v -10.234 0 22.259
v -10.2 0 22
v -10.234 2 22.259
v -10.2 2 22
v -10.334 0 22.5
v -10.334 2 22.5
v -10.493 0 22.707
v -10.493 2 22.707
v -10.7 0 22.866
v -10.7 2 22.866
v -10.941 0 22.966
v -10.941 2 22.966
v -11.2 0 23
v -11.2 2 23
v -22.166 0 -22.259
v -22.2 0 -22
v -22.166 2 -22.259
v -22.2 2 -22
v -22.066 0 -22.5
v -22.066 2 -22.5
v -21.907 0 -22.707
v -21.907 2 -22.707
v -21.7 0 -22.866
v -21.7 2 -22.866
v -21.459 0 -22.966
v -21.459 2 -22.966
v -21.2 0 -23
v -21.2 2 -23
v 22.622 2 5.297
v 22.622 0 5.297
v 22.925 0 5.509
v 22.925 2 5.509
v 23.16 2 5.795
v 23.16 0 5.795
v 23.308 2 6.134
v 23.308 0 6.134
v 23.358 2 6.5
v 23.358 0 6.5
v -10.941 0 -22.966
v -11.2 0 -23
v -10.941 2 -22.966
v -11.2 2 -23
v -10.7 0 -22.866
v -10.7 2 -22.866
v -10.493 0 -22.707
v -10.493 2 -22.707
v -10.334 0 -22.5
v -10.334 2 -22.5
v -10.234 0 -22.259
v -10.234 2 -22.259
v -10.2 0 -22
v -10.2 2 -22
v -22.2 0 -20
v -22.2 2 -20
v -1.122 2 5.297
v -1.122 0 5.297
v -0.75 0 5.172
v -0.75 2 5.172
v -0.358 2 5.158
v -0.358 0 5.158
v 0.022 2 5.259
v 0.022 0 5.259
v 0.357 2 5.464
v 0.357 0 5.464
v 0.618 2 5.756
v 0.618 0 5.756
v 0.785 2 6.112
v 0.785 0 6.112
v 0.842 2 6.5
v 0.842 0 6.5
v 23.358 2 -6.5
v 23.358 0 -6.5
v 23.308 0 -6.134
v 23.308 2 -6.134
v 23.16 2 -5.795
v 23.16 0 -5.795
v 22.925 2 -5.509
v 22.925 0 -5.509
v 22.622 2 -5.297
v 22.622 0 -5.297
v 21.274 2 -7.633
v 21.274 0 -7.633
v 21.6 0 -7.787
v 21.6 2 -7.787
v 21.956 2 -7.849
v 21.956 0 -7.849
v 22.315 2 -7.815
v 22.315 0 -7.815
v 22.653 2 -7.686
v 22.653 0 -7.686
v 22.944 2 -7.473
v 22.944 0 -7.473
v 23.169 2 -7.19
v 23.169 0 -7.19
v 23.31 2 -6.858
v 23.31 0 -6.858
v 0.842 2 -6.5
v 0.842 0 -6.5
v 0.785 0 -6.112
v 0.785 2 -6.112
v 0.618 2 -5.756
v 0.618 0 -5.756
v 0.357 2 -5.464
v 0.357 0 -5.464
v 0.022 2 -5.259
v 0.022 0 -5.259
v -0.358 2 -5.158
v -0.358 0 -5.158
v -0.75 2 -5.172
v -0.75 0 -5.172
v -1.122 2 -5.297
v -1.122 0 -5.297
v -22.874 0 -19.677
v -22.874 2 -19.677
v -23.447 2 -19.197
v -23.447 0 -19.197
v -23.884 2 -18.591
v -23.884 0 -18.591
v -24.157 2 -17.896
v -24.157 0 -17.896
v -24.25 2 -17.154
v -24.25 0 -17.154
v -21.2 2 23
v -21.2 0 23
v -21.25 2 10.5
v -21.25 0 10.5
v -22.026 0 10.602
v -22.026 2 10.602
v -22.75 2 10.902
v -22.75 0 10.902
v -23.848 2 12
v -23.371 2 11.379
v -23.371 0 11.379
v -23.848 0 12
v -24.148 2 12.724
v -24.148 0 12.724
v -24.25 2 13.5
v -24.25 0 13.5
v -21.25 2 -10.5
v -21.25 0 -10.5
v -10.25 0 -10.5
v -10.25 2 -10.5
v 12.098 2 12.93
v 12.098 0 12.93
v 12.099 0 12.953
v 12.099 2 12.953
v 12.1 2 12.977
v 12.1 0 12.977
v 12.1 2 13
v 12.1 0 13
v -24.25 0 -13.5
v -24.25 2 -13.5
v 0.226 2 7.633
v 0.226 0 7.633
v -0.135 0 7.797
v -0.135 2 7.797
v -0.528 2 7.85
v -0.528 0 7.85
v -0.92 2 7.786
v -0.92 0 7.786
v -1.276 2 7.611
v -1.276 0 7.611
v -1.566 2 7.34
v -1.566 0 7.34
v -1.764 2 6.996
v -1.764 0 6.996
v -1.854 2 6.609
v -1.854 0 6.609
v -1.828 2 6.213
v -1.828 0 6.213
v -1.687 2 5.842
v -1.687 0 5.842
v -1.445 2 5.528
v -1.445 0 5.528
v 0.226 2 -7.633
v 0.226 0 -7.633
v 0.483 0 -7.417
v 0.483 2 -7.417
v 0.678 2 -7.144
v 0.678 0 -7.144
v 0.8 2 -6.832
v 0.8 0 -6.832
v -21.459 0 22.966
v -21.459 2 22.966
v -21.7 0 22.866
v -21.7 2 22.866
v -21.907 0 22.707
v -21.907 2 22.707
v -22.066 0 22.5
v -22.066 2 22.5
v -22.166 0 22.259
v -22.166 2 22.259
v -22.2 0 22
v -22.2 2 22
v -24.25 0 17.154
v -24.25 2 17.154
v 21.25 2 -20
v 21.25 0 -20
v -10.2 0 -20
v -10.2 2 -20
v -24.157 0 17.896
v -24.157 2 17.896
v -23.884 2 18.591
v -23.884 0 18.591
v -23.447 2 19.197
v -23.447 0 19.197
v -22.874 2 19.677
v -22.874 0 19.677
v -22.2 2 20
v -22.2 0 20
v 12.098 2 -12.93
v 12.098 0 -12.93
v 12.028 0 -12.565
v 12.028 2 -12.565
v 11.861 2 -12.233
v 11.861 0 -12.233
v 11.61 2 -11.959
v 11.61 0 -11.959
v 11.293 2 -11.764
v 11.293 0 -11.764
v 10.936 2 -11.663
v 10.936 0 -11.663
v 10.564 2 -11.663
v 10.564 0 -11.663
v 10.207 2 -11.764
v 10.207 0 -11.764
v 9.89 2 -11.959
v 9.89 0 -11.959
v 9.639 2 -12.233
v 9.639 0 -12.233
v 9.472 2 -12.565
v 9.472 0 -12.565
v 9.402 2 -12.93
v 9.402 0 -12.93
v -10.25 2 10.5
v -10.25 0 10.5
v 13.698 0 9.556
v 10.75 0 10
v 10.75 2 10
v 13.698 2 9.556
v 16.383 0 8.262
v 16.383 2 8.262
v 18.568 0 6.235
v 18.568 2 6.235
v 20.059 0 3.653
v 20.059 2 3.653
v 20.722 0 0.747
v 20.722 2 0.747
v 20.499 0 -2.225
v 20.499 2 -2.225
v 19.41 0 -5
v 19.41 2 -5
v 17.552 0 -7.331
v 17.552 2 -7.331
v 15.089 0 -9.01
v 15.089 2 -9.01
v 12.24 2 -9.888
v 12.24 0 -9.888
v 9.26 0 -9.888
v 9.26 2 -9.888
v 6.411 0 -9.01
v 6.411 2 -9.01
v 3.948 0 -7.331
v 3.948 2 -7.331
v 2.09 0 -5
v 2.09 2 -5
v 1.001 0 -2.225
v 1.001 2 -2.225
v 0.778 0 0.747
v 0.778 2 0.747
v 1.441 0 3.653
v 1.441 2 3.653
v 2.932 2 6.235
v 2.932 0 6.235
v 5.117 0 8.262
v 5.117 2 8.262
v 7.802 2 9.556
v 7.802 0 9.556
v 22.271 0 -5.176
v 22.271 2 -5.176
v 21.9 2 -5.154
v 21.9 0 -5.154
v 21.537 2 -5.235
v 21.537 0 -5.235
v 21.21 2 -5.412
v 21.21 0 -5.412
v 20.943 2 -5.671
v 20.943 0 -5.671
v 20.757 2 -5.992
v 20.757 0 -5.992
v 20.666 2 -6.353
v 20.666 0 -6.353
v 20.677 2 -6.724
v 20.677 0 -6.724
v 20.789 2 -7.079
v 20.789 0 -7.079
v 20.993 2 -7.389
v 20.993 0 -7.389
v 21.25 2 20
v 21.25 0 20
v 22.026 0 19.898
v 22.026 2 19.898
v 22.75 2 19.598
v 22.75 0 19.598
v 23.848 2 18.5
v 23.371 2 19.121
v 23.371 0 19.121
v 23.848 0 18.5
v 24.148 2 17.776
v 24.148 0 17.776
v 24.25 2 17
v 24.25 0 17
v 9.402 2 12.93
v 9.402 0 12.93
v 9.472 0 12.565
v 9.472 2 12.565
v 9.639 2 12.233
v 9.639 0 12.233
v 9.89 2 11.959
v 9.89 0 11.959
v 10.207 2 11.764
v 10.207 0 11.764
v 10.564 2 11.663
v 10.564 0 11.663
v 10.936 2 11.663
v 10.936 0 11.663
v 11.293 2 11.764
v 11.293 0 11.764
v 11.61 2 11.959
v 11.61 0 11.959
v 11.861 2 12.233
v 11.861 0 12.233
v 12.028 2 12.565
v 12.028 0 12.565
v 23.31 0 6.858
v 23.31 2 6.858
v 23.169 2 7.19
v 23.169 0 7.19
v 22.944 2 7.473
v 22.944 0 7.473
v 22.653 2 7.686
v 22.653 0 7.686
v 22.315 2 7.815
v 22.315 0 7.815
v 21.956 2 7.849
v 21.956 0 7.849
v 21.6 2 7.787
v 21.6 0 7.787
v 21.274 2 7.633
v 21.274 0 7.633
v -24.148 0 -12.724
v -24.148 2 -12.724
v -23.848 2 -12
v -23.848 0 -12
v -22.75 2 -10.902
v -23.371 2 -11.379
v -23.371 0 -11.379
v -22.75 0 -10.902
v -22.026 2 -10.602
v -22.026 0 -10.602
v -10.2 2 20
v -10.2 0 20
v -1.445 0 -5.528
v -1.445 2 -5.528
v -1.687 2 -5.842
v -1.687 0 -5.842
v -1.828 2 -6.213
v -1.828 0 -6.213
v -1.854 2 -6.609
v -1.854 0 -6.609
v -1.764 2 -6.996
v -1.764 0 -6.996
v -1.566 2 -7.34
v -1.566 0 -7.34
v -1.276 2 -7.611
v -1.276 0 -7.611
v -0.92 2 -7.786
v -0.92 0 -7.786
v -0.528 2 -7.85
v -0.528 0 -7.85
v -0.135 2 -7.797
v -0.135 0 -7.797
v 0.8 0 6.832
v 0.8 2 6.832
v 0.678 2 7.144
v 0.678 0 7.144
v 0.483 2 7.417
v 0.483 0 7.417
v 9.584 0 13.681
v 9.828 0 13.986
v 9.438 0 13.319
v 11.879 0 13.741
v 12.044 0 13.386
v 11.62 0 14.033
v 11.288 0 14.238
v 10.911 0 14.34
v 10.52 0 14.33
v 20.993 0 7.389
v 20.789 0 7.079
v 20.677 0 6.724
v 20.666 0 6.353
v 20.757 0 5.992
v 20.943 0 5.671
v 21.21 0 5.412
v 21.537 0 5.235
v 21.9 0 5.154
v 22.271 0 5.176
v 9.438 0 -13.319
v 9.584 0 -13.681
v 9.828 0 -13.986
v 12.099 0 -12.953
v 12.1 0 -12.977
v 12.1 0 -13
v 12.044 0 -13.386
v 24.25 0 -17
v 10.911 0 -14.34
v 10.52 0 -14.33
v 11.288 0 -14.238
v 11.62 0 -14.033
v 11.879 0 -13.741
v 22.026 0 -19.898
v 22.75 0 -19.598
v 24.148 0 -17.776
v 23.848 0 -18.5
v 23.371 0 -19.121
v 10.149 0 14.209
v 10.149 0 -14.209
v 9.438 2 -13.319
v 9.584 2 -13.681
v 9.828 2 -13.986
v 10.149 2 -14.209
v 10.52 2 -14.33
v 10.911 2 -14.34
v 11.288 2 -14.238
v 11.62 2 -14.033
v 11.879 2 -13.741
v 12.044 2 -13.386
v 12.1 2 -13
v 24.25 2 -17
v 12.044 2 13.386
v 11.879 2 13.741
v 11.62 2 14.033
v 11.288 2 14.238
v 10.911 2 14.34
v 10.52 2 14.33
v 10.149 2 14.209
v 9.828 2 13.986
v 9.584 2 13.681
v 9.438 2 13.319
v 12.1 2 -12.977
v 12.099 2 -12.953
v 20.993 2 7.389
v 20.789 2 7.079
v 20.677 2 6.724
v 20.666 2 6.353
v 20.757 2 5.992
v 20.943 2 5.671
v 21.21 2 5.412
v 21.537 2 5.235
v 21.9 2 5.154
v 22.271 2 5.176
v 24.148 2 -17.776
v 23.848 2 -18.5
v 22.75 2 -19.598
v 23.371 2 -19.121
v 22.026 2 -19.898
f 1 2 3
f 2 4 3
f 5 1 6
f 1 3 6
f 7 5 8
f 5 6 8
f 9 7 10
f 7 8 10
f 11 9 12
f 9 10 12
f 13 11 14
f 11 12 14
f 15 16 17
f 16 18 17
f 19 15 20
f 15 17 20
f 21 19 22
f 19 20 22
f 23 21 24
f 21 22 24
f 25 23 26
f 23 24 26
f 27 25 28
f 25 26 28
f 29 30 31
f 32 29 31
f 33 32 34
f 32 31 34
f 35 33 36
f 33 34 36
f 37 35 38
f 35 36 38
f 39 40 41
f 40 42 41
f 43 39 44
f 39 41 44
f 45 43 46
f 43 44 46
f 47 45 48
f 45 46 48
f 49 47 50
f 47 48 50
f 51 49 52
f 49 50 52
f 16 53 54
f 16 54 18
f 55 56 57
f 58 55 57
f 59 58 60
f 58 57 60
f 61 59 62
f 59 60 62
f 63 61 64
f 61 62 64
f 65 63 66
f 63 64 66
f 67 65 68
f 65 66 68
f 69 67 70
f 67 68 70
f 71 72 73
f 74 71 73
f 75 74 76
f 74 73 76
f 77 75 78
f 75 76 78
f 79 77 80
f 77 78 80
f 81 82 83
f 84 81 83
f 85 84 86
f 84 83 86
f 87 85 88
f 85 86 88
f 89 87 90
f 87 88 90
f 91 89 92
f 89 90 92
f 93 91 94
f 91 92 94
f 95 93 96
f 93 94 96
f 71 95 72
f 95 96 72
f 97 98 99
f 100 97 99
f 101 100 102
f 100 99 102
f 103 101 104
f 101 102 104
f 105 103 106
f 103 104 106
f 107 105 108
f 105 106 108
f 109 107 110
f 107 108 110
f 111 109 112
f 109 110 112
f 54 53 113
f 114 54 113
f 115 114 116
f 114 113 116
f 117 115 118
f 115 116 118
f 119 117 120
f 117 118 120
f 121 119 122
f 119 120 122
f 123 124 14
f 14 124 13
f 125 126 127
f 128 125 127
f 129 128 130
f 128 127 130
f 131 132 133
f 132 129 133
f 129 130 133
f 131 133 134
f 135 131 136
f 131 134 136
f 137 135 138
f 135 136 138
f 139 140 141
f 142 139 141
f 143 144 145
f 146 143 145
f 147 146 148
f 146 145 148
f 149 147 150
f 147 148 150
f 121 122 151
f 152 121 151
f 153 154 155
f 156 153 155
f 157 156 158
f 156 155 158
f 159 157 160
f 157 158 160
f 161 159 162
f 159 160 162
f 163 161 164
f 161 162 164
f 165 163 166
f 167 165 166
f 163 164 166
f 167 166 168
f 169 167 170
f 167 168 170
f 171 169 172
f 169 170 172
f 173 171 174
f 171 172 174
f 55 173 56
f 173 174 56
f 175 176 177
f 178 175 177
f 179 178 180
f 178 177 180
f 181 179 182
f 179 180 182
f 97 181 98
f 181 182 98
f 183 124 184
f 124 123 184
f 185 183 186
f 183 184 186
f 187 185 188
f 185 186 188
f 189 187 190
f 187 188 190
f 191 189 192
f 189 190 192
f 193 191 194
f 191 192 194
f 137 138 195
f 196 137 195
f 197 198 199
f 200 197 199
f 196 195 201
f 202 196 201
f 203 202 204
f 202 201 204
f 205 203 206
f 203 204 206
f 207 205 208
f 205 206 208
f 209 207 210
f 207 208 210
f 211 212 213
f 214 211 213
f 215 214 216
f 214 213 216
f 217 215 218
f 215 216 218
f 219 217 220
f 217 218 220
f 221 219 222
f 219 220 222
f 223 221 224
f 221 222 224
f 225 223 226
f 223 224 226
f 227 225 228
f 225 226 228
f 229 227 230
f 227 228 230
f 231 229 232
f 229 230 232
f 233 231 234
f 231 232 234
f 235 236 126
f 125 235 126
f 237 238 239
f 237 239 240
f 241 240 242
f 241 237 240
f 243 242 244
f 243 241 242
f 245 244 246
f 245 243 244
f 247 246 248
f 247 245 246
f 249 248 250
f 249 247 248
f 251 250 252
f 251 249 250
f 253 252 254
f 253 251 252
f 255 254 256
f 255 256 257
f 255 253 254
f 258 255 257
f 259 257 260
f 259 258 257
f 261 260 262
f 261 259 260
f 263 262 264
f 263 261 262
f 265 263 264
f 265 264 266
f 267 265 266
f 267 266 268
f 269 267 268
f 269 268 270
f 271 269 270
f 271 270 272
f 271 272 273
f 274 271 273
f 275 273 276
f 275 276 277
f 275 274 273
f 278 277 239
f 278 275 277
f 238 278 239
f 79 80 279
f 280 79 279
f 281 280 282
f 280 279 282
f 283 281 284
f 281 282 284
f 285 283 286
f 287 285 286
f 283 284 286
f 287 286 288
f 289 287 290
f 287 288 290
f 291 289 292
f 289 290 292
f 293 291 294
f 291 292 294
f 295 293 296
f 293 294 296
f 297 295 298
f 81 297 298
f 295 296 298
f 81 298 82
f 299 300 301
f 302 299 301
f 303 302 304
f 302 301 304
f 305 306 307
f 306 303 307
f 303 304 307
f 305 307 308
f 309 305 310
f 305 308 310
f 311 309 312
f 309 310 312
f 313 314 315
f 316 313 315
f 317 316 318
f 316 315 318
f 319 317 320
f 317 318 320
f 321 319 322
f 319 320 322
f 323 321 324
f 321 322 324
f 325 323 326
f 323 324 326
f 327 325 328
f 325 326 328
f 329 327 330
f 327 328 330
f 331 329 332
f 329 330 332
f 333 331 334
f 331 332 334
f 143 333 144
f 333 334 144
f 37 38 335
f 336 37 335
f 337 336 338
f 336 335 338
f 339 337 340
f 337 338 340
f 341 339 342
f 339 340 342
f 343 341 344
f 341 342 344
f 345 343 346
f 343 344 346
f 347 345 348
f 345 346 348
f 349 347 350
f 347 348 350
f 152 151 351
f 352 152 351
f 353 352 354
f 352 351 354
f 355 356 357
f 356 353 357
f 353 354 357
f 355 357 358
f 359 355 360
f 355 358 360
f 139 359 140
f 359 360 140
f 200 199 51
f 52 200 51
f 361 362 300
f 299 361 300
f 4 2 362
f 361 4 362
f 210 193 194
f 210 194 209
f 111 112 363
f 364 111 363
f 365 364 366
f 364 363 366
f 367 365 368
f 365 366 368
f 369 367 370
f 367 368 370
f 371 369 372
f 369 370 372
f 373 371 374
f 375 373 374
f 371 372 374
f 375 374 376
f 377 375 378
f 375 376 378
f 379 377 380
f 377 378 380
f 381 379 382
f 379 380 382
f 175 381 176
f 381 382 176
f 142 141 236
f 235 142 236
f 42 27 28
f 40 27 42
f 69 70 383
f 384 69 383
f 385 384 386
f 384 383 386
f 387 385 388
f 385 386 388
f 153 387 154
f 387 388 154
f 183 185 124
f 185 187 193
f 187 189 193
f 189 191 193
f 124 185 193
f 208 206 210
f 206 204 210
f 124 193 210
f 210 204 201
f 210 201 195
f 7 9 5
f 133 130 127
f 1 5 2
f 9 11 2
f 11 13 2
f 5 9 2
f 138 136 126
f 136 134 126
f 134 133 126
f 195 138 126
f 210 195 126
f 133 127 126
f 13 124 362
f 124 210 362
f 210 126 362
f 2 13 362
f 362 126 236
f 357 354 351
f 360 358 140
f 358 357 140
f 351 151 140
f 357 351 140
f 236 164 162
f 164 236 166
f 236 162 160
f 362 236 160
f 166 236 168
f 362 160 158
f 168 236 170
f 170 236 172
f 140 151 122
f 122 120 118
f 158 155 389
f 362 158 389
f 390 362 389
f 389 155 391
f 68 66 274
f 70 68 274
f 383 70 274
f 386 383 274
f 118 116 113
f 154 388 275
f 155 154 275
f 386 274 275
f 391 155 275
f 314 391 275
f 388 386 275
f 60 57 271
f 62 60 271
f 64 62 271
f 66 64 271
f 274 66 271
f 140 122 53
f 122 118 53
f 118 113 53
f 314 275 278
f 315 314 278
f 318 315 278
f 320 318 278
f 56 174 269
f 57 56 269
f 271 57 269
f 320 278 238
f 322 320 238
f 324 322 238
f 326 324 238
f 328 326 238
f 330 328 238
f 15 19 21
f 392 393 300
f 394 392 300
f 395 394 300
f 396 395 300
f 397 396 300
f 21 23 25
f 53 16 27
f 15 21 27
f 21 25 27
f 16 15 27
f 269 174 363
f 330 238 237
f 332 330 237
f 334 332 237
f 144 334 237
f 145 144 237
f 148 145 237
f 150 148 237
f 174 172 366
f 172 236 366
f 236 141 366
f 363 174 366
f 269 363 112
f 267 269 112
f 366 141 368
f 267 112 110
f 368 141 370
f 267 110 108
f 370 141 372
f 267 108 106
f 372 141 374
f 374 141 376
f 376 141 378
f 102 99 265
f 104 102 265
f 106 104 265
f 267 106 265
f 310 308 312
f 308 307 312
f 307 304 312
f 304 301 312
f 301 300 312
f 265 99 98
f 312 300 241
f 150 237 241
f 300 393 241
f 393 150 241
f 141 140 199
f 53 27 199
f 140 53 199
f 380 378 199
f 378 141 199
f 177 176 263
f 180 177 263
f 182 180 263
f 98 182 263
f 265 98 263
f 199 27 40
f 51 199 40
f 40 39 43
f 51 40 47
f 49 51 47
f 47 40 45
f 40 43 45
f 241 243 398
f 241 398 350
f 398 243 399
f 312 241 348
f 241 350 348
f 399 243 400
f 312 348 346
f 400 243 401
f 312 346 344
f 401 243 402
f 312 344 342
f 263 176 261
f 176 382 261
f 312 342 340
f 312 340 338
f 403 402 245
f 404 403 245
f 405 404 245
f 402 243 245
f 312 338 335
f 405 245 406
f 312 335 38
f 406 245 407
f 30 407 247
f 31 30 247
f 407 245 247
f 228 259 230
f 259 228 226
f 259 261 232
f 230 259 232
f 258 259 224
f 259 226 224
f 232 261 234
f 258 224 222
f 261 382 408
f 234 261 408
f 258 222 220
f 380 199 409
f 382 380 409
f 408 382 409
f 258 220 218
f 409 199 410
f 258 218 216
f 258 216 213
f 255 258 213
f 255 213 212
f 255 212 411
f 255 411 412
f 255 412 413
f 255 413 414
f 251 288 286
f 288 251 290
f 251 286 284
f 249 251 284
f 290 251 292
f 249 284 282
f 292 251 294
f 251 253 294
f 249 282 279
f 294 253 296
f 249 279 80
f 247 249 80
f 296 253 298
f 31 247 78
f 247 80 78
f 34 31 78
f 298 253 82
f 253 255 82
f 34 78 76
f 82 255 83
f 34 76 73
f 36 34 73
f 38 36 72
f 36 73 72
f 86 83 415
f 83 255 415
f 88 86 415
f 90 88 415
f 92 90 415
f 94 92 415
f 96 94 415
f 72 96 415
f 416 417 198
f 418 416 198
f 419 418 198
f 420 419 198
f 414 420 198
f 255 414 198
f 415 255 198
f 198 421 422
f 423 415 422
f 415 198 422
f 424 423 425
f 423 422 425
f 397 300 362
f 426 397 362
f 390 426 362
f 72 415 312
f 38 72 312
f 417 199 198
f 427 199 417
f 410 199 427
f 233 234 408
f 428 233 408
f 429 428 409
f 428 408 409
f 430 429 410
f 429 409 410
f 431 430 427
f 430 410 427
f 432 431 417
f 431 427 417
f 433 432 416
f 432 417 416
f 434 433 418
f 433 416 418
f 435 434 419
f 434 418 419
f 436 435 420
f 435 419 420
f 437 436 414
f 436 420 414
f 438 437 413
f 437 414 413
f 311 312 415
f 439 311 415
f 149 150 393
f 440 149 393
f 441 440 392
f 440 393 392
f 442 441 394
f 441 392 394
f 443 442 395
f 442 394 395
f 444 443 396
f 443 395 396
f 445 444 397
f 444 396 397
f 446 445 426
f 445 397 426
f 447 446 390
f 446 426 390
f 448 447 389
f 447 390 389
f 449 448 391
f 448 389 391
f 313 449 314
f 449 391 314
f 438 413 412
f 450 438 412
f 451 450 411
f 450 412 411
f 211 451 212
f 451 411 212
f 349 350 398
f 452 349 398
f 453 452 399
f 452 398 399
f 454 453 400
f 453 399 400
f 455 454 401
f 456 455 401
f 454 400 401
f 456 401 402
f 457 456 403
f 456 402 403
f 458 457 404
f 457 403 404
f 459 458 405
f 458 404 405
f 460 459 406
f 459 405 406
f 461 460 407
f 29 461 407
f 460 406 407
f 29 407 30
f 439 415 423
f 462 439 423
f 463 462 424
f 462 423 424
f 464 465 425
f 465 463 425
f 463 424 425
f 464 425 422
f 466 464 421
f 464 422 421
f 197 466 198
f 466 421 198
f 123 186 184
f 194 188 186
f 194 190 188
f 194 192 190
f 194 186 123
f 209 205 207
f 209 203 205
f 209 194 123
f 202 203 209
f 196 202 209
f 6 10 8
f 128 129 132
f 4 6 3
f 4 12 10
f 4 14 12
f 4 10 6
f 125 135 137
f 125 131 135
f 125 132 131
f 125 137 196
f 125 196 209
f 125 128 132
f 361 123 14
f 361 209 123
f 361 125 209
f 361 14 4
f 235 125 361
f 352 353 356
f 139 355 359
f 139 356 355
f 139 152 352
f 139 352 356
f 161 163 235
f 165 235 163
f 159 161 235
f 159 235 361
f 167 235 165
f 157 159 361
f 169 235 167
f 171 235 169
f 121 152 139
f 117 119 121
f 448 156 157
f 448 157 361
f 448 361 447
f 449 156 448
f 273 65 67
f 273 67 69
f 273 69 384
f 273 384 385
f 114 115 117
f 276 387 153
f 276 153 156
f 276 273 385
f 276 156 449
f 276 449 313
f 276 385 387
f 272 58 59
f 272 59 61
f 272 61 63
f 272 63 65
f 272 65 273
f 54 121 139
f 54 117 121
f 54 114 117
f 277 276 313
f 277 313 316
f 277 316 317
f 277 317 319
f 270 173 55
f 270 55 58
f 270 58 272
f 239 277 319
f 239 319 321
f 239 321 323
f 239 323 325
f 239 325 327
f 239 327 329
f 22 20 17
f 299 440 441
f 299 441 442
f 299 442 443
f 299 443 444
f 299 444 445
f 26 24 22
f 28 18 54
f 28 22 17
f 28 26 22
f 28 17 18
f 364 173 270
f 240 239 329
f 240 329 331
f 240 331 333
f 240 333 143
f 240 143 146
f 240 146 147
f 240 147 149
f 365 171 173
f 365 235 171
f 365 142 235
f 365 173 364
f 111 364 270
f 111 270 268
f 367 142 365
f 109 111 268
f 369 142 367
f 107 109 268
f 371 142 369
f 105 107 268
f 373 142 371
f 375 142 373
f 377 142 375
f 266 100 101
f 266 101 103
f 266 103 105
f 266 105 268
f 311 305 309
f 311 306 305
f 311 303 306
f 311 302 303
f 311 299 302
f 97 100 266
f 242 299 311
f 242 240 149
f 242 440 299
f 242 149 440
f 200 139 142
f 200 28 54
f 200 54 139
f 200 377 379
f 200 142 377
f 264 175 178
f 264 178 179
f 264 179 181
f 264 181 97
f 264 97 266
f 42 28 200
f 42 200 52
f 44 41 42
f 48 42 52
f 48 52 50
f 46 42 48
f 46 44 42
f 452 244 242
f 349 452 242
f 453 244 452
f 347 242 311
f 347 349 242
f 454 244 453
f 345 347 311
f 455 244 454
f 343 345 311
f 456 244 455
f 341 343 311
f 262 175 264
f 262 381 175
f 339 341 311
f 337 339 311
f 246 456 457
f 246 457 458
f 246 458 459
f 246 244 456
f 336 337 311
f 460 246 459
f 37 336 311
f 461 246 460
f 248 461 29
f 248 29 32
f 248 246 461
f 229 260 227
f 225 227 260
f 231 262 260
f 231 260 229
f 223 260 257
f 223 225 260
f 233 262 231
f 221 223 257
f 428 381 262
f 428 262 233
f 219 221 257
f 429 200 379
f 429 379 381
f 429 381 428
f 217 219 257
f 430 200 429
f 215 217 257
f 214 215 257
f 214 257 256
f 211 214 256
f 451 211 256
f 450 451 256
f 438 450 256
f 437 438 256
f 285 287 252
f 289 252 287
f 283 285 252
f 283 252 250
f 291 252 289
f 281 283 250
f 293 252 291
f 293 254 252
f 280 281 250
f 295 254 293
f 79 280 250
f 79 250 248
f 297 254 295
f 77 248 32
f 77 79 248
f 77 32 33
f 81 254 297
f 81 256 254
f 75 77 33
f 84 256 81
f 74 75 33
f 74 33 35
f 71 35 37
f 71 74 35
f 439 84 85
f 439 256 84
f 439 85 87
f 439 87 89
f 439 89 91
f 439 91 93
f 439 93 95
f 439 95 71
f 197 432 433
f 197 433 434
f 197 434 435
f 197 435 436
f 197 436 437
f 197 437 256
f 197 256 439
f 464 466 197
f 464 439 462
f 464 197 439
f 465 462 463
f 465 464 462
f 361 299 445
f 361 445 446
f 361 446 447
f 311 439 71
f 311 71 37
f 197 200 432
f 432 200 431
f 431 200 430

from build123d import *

# Parameters (mm, degrees)
SKETCH_1_W      = 12
SKETCH_1_H      = 3
SKETCH_1_R      = 10
EXTRUDE_1_DEPTH = 2
FILLET_1_R      = 3
FILLET_2_R      = 1


with BuildPart() as part:
    # 草图1 → 凸台-拉伸1 (new body)
    # profile 1 of 4: a face of its own
    with BuildSketch(Plane(origin=(0, 0, 0), x_dir=(1, 0, 0), z_dir=(0, 1, 0))):
        Polygon((-24.25, -10.5), (-24.25, -20), (-22.2, -20), (-10.2, -20), (24.25, -20), (24.25, 20), (-10.2, 20), (-22.2, 20), (-24.25, 20), (-24.25, 10.5), (-10.25, 10.5), (-10.25, -10.5), align=None)
        with BuildLine():
            ThreePointArc((22.621714683, 5.297394688), (23.75, 0), (22.621714683, -5.297394688))
            ThreePointArc((22.621714683, -5.297394688), (23.159540262, -5.794864902), (23.358330249, -6.5))
            ThreePointArc((23.358330249, -6.5), (22.652739816, -7.686269915), (21.273535715, -7.632509158))
            ThreePointArc((21.273535715, -7.632509158), (17.25, -11.258330249), (12.098178968, -12.929903846))
            ThreePointArc((12.098178968, -12.929903846), (12.099544665, -12.964940098), (12.1, -13))
            ThreePointArc((12.1, -13), (10.714940098, -14.349544665), (9.401821032, -12.929903846))
            ThreePointArc((9.401821032, -12.929903846), (4.25, -11.258330249), (0.226464285, -7.632509158))
            ThreePointArc((0.226464285, -7.632509158), (-1.677464544, -7.175), (-1.121714683, -5.297394688))
            ThreePointArc((-1.121714683, -5.297394688), (-2.25, 0), (-1.121714683, 5.297394688))
            ThreePointArc((-1.121714683, 5.297394688), (-1.677464544, 7.175), (0.226464285, 7.632509158))
            ThreePointArc((0.226464285, 7.632509158), (4.25, 11.258330249), (9.401821032, 12.929903846))
            ThreePointArc((9.401821032, 12.929903846), (10.714940098, 14.349544665), (12.1, 13))
            ThreePointArc((12.1, 13), (12.099544665, 12.964940098), (12.098178968, 12.929903846))
            ThreePointArc((12.098178968, 12.929903846), (17.25, 11.258330249), (21.273535715, 7.632509158))
            ThreePointArc((21.273535715, 7.632509158), (22.652739816, 7.686269915), (23.358330249, 6.5))
            ThreePointArc((23.358330249, 6.5), (23.159540262, 5.794864902), (22.621714683, 5.297394688))
        make_face(mode=Mode.SUBTRACT)
    # profile 2 of 4: a face of its own
    with BuildSketch(Plane(origin=(0, 0, 0), x_dir=(1, 0, 0), z_dir=(0, 1, 0))):
        with Locations((-16.2, 21.5)):
            Rectangle(SKETCH_1_W, SKETCH_1_H)
    # profile 3 of 4: a face of its own
    with BuildSketch(Plane(origin=(0, 0, 0), x_dir=(1, 0, 0), z_dir=(0, 1, 0))):
        with Locations((-16.2, -21.5)):
            Rectangle(SKETCH_1_W, SKETCH_1_H)
    # profile 4 of 4: a face of its own
    with BuildSketch(Plane(origin=(0, 0, 0), x_dir=(1, 0, 0), z_dir=(0, 1, 0))):
        with BuildLine():
            ThreePointArc((21.273535715, -7.632509158), (20.839195954, -5.825), (22.621714683, -5.297394688))
            ThreePointArc((22.621714683, -5.297394688), (23.75, 0), (22.621714683, 5.297394688))
            ThreePointArc((22.621714683, 5.297394688), (20.839195954, 5.825), (21.273535715, 7.632509158))
            ThreePointArc((21.273535715, 7.632509158), (17.25, 11.258330249), (12.098178968, 12.929903846))
            ThreePointArc((12.098178968, 12.929903846), (10.75, 11.65), (9.401821032, 12.929903846))
            ThreePointArc((9.401821032, 12.929903846), (4.25, 11.258330249), (0.226464285, 7.632509158))
            ThreePointArc((0.226464285, 7.632509158), (0.677939665, 7.144409567), (0.841669751, 6.5))
            ThreePointArc((0.841669751, 6.5), (0.196804849, 5.348789987), (-1.121714683, 5.297394688))
            ThreePointArc((-1.121714683, 5.297394688), (-2.25, 0), (-1.121714683, -5.297394688))
            ThreePointArc((-1.121714683, -5.297394688), (0.196804849, -5.348789987), (0.841669751, -6.5))
            ThreePointArc((0.841669751, -6.5), (0.677939665, -7.144409567), (0.226464285, -7.632509158))
            ThreePointArc((0.226464285, -7.632509158), (4.25, -11.258330249), (9.401821032, -12.929903846))
            ThreePointArc((9.401821032, -12.929903846), (10.75, -11.65), (12.098178968, -12.929903846))
            ThreePointArc((12.098178968, -12.929903846), (17.25, -11.258330249), (21.273535715, -7.632509158))
        make_face()
        with Locations(Location((10.75, 0, 0), (0, 0, 270))):
            Circle(SKETCH_1_R, mode=Mode.SUBTRACT)
    extrude(amount=EXTRUDE_1_DEPTH)

    # 圆角1
    # the kernel refuses this fillet: 3 mm, written as the material it takes off along each edge
    with BuildSketch(Plane(origin=(-24.25, -7.5, -10.5), x_dir=(1, 0, 0), z_dir=(0, 1, 0)), Plane(origin=(24.25, -7.5, -20), x_dir=(-1, 0, 0), z_dir=(0, 1, 0)), Plane(origin=(24.25, -7.5, 20), x_dir=(0, 0, -1), z_dir=(0, 1, 0)), Plane(origin=(-24.25, -7.5, 10.5), x_dir=(0, 0, 1), z_dir=(0, 1, 0))) as fillet_1_piece_1:
        with BuildLine():
            CenterArc((FILLET_1_R, FILLET_1_R), FILLET_1_R, 180, 90)
            Line((0, FILLET_1_R), (-FILLET_1_R * 0.02, FILLET_1_R))
            Line((-FILLET_1_R * 0.02, FILLET_1_R), (-FILLET_1_R * 0.02, -FILLET_1_R * 0.02))
            Line((-FILLET_1_R * 0.02, -FILLET_1_R * 0.02), (FILLET_1_R, -FILLET_1_R * 0.02))
            Line((FILLET_1_R, -FILLET_1_R * 0.02), (FILLET_1_R, 0))
        make_face()
    extrude(amount=17, mode=Mode.SUBTRACT)
    with BuildSketch(Plane(origin=(-24.25, -7.114026638, -20), x_dir=(0, 0, 1), z_dir=(0, 1, 0))) as fillet_1_piece_2:
        with BuildLine():
            CenterArc((2.845610655, 3), FILLET_1_R, 198.461458297, 71.538541703)
            Line((0, 2.05), (-0.056912213, 2.031))
            ThreePointArc((-0.056912213, 2.031), (-0.06, 1.025), (-0.06, 0))
            Line((-0.06, 0), (0, -0.06))
            Line((0, -0.06), (2.845610655, -0.06))
            Line((2.845610655, -0.06), (2.845610655, 0))
        make_face()
    extrude(amount=16.228053275, mode=Mode.SUBTRACT)
    with BuildSketch(Plane(origin=(-24.25, -7.114026638, 20), x_dir=(0, 0, -1), z_dir=(0, 1, 0))) as fillet_1_piece_3:
        with BuildLine():
            CenterArc((2.845610655, -3), FILLET_1_R, 90, 71.538541703)
            Line((0, -2.05), (-0.056912213, -2.031))
            ThreePointArc((-0.056912213, -2.031), (-0.06, -1.025), (-0.06, 0))
            Line((-0.06, 0), (0, 0.06))
            Line((0, 0.06), (2.845610655, 0.06))
            Line((2.845610655, 0.06), (2.845610655, 0))
        make_face()
    extrude(amount=16.228053275, mode=Mode.SUBTRACT)

    # 圆角2
    fillet_2_edges = [part.edges().sort_by_distance(p)[0] for p in [
        (-22.2, 1, -23),
        (-10.2, 1, -23),
        (-10.2, 1, 23),
        (-22.2, 1, 23),
    ]]
    fillet(fillet_2_edges, radius=FILLET_2_R)


solid = part.part
